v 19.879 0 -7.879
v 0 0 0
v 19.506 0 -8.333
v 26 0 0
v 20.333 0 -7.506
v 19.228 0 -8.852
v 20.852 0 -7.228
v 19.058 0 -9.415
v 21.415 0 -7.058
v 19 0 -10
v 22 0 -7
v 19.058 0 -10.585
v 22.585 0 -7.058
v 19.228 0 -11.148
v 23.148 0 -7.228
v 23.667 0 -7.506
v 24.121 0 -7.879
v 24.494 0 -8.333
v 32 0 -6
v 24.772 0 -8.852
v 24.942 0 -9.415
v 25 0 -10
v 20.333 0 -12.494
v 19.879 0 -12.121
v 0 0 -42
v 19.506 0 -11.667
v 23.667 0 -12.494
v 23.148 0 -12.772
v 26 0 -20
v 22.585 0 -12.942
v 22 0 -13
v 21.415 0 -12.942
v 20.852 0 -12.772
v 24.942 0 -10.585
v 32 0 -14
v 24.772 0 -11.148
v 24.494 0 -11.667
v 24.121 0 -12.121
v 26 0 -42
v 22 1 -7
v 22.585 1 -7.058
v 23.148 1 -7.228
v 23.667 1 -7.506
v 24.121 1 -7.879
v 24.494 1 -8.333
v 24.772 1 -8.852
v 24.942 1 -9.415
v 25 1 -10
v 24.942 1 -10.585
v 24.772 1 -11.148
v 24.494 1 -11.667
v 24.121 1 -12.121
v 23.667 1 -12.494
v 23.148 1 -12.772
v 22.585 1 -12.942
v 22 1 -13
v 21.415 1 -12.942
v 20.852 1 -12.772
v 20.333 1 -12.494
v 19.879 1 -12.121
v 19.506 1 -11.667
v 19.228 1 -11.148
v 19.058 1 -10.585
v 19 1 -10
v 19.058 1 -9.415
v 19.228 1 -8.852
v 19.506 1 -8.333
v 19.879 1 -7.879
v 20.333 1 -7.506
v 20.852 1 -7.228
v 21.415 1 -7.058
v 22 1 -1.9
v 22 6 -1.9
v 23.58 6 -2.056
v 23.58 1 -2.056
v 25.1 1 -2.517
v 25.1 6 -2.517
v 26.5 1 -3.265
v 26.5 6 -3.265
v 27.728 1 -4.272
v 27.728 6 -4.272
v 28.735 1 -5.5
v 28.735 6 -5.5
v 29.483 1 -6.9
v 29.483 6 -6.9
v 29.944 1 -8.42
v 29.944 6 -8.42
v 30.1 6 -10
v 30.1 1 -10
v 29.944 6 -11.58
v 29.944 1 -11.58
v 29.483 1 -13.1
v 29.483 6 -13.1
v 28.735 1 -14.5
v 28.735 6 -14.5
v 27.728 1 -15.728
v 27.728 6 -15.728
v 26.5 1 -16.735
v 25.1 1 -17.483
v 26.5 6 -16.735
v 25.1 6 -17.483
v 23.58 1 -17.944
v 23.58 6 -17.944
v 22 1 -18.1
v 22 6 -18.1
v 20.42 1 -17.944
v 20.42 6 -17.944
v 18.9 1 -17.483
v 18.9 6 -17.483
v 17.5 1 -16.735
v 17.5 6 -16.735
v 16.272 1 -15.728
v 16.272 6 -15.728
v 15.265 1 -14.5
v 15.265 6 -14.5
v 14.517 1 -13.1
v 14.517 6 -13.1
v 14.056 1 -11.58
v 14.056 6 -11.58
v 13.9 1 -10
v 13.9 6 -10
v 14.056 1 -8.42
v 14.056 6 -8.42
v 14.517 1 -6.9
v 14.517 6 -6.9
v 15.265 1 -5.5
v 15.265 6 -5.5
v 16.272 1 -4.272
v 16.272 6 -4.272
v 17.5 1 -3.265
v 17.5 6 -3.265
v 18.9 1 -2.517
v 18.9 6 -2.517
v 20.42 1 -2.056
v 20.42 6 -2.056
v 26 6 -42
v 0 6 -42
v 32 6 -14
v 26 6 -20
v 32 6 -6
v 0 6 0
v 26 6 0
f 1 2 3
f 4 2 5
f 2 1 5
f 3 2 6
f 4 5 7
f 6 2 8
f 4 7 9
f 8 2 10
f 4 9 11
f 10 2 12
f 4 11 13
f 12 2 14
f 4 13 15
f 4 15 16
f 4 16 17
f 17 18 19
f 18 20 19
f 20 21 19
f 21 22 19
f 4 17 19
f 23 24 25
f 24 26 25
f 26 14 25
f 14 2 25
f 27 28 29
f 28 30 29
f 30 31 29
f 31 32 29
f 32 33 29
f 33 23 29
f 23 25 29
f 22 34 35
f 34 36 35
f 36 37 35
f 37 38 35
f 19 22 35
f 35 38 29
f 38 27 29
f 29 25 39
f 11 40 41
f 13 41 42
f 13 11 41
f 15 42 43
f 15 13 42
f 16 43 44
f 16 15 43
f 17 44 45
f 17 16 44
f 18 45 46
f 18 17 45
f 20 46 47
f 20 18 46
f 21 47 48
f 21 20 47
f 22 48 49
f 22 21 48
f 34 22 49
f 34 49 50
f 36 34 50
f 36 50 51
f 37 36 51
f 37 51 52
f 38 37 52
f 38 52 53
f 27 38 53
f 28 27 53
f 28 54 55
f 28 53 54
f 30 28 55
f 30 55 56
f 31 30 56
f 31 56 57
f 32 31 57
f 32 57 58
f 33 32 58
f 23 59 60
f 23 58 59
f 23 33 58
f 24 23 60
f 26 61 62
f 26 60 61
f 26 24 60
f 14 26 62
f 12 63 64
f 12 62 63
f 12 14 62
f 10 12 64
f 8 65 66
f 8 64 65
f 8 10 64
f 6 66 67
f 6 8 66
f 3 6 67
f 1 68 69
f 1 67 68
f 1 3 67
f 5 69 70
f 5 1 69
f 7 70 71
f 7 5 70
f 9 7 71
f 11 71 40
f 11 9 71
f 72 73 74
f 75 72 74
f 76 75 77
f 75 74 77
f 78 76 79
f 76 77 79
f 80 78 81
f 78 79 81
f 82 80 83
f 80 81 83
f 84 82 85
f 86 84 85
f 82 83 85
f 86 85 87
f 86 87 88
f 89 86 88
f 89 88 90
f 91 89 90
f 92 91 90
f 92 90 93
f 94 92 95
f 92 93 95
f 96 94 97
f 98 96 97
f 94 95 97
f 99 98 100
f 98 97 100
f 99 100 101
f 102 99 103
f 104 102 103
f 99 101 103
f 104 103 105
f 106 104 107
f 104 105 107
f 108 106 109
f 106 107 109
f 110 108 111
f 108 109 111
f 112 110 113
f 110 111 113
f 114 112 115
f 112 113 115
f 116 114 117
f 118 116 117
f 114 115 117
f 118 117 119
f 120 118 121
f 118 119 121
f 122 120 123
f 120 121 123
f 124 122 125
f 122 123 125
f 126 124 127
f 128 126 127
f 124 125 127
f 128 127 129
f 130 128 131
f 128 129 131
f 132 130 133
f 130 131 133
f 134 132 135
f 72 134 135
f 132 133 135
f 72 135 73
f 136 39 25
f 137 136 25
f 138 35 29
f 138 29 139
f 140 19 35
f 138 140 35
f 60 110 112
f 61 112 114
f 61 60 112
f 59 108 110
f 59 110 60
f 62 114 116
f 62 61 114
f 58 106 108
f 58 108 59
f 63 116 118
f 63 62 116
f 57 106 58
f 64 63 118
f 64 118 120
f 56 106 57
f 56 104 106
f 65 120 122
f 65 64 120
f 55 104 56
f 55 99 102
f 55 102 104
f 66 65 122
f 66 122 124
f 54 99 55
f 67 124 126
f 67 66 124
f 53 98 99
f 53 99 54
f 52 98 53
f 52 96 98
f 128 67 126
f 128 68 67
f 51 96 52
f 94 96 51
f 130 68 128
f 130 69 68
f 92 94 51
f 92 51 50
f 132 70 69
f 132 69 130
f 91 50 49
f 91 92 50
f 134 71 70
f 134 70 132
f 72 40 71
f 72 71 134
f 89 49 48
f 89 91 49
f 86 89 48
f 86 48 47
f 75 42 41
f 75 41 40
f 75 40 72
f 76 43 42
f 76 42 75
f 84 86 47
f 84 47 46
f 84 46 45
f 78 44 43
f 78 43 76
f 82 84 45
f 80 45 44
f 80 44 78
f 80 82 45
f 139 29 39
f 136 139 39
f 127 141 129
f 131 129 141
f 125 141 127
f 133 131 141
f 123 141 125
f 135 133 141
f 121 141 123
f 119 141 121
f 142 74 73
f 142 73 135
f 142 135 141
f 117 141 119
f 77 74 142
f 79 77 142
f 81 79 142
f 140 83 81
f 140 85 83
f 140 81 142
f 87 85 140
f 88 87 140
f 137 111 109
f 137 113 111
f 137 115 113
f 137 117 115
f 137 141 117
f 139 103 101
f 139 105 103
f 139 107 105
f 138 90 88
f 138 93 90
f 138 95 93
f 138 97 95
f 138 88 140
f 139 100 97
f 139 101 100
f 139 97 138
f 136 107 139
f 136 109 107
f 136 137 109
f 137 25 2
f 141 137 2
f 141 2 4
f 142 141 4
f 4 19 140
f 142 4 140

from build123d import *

# Parameters (mm, degrees)
SKETCH1_R           = 3
BOSS_EXTRUDE1_DEPTH = 6
CHAMFER1_SIZE       = 6
SKETCH2_R           = 8.1
CUT_EXTRUDE1_DEPTH  = 5


with BuildPart() as part:
    # Sketch1 → Boss-Extrude1 (new body)
    with BuildSketch(Plane(origin=(0, 0, 0), x_dir=(1, 0, 0), z_dir=(0, 1, 0))):
        Polygon((0, 0), (32, 0), (32, 20), (26, 20), (26, 42), (0, 42), align=None)
        with Locations(Location((22, 10, 0), (0, 0, 270))):
            Circle(SKETCH1_R, mode=Mode.SUBTRACT)
    extrude(amount=BOSS_EXTRUDE1_DEPTH)

    # Chamfer1
    chamfer1_edges = [part.edges().sort_by_distance(p)[0] for p in [
        (32, 3, -20),
        (32, 3, 0),
    ]]
    chamfer(chamfer1_edges, length=CHAMFER1_SIZE - 0.0001)  # a hair under: the kernel refuses the full size

    # Sketch2 → Cut-Extrude1 (cut)
    with BuildSketch(Plane(origin=(0, 6, 0), x_dir=(1, 0, 0), z_dir=(0, 1, 0))):
        with Locations(Location((22, 10, 0), (0, 0, 270))):
            Circle(SKETCH2_R)
    extrude(amount=-CUT_EXTRUDE1_DEPTH, mode=Mode.SUBTRACT)


solid = part.part
